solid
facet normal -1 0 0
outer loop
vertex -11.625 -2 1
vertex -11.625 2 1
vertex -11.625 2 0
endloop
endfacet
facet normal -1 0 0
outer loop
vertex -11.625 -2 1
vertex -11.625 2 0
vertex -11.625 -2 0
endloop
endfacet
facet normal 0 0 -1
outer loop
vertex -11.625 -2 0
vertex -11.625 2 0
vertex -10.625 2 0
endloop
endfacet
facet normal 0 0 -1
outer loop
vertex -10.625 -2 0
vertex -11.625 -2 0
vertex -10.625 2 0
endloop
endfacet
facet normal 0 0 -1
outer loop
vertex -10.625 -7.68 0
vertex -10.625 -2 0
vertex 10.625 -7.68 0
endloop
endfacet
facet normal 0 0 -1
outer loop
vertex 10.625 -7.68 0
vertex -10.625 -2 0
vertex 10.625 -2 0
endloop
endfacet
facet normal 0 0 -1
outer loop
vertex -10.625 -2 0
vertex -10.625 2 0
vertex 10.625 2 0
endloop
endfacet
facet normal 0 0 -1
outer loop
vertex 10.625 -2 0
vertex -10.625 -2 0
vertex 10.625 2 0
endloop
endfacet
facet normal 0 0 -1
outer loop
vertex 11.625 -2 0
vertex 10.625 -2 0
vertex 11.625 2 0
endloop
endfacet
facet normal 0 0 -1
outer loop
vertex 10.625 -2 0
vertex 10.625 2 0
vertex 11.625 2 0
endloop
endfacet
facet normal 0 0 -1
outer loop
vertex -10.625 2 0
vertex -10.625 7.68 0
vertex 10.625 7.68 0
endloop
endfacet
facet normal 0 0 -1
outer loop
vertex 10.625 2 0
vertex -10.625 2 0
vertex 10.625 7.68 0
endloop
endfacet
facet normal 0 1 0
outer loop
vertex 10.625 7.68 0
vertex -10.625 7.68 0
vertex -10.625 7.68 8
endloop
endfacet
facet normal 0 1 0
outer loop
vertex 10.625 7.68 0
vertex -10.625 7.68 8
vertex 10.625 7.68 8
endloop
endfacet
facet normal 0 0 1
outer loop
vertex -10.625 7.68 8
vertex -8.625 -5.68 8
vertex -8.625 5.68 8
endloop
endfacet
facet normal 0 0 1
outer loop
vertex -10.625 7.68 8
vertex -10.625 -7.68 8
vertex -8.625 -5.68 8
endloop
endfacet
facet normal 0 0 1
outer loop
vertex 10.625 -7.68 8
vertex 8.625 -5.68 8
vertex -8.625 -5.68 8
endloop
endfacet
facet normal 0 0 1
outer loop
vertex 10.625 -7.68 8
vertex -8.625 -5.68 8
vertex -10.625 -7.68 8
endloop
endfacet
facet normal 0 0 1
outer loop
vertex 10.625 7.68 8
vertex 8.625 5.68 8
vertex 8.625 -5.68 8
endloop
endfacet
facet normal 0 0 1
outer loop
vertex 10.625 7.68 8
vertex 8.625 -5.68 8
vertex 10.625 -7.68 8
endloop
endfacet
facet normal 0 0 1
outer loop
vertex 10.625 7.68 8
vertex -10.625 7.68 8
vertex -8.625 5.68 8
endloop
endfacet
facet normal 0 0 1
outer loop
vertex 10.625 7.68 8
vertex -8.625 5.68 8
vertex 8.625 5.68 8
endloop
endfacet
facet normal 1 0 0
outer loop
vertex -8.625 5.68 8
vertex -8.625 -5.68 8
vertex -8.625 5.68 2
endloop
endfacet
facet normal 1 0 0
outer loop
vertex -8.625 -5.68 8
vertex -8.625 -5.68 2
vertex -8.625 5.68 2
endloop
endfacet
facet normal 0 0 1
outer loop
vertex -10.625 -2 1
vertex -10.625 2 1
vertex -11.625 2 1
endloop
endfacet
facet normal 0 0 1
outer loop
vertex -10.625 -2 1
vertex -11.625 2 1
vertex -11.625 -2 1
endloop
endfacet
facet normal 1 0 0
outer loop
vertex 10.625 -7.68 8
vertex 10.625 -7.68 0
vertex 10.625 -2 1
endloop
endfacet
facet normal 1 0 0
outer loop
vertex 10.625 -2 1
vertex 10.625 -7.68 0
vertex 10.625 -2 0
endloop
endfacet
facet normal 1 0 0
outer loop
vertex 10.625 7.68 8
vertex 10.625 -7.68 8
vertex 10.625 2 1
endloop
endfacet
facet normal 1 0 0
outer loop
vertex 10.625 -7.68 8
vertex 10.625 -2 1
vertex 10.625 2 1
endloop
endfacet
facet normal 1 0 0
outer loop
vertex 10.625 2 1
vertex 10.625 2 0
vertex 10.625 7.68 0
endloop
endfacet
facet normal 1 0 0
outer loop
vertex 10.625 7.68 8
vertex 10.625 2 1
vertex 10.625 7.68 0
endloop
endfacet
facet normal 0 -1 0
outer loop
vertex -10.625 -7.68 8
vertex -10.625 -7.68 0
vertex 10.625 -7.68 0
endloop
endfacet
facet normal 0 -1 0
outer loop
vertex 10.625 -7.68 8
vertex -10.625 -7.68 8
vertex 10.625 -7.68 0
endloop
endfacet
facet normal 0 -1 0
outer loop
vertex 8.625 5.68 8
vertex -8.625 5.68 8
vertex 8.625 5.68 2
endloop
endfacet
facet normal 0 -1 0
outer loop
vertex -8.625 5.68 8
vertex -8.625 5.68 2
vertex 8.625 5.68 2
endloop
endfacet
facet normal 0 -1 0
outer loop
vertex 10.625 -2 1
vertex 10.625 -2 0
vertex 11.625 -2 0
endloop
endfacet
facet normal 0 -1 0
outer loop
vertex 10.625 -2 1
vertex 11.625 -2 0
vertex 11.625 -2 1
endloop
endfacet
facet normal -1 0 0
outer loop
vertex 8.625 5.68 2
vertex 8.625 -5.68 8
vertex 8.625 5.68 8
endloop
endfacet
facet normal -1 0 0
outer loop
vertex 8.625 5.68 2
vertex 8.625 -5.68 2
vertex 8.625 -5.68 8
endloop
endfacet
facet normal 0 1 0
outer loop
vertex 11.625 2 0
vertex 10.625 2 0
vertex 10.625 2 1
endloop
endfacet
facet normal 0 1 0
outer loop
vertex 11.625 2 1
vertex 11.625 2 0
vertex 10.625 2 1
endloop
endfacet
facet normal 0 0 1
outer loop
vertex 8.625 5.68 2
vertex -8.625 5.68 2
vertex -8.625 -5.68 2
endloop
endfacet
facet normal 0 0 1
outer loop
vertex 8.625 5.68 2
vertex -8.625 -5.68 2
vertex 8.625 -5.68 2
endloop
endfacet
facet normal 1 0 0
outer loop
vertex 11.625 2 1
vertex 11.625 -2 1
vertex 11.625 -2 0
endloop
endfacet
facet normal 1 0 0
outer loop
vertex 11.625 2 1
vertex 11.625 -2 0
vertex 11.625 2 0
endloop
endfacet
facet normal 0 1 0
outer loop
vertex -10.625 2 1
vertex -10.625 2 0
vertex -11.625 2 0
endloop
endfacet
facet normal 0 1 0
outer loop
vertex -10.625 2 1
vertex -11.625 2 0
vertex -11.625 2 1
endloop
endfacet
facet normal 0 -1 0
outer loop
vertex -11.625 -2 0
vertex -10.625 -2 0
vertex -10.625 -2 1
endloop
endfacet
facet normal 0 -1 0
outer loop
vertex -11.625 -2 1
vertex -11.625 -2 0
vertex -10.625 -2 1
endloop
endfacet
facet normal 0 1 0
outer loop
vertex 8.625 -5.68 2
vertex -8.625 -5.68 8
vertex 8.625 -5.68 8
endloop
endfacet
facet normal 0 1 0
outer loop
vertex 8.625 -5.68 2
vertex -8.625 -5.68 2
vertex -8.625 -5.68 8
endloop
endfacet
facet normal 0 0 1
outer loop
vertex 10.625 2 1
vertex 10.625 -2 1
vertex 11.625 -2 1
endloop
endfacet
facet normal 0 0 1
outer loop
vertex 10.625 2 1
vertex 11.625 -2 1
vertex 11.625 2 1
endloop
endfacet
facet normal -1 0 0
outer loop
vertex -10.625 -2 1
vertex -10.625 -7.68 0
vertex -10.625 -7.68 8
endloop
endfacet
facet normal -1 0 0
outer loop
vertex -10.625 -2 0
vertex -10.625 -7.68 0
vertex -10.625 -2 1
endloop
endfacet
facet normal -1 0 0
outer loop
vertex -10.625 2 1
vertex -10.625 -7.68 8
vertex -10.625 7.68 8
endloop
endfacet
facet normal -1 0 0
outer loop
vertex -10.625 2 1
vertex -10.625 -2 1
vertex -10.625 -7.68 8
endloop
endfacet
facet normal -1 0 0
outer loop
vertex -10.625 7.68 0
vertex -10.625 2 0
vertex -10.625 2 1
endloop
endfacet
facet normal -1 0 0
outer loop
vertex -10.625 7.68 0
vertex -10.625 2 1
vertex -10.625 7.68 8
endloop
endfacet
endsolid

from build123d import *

# Parameters (mm, degrees)
F0_W     = 21.25
F0_H     = 15.36
F1_DEPTH = 8
F2_T     = -2
F3_W     = 4
F3_H     = 1
F4_DEPTH = 1
F5_W     = 4
F5_H     = 1
F6_DEPTH = 1


# Not quite as in the source:
# - a feature names something its author has since deleted; it is built from what else it names


with BuildPart() as f1:
    # F0 (on Top) → F1 (new body)
    with BuildSketch(Plane.XY):
        Rectangle(F0_W, F0_H)
    extrude(amount=F1_DEPTH)

    # F2
    f2_openings = [f1.faces().sort_by_distance(p)[0] for p in [
        (0, 0, 8),
    ]]
    offset(amount=F2_T, openings=f2_openings)

    # F3 (on face) → F4 (join)
    with BuildSketch(Plane(origin=(-10.625, 0, 0), x_dir=(0, -1, 0), z_dir=(-1, 0, 0))):
        with Locations((0, 0.5)):
            Rectangle(F3_W, F3_H)
    extrude(amount=F4_DEPTH)

    # F5 (on face) → F6 (join)
    with BuildSketch(Plane.YZ.offset(10.625)):
        with Locations((0, 0.5)):
            Rectangle(F5_W, F5_H)
    extrude(amount=F6_DEPTH)


solid = f1.part
